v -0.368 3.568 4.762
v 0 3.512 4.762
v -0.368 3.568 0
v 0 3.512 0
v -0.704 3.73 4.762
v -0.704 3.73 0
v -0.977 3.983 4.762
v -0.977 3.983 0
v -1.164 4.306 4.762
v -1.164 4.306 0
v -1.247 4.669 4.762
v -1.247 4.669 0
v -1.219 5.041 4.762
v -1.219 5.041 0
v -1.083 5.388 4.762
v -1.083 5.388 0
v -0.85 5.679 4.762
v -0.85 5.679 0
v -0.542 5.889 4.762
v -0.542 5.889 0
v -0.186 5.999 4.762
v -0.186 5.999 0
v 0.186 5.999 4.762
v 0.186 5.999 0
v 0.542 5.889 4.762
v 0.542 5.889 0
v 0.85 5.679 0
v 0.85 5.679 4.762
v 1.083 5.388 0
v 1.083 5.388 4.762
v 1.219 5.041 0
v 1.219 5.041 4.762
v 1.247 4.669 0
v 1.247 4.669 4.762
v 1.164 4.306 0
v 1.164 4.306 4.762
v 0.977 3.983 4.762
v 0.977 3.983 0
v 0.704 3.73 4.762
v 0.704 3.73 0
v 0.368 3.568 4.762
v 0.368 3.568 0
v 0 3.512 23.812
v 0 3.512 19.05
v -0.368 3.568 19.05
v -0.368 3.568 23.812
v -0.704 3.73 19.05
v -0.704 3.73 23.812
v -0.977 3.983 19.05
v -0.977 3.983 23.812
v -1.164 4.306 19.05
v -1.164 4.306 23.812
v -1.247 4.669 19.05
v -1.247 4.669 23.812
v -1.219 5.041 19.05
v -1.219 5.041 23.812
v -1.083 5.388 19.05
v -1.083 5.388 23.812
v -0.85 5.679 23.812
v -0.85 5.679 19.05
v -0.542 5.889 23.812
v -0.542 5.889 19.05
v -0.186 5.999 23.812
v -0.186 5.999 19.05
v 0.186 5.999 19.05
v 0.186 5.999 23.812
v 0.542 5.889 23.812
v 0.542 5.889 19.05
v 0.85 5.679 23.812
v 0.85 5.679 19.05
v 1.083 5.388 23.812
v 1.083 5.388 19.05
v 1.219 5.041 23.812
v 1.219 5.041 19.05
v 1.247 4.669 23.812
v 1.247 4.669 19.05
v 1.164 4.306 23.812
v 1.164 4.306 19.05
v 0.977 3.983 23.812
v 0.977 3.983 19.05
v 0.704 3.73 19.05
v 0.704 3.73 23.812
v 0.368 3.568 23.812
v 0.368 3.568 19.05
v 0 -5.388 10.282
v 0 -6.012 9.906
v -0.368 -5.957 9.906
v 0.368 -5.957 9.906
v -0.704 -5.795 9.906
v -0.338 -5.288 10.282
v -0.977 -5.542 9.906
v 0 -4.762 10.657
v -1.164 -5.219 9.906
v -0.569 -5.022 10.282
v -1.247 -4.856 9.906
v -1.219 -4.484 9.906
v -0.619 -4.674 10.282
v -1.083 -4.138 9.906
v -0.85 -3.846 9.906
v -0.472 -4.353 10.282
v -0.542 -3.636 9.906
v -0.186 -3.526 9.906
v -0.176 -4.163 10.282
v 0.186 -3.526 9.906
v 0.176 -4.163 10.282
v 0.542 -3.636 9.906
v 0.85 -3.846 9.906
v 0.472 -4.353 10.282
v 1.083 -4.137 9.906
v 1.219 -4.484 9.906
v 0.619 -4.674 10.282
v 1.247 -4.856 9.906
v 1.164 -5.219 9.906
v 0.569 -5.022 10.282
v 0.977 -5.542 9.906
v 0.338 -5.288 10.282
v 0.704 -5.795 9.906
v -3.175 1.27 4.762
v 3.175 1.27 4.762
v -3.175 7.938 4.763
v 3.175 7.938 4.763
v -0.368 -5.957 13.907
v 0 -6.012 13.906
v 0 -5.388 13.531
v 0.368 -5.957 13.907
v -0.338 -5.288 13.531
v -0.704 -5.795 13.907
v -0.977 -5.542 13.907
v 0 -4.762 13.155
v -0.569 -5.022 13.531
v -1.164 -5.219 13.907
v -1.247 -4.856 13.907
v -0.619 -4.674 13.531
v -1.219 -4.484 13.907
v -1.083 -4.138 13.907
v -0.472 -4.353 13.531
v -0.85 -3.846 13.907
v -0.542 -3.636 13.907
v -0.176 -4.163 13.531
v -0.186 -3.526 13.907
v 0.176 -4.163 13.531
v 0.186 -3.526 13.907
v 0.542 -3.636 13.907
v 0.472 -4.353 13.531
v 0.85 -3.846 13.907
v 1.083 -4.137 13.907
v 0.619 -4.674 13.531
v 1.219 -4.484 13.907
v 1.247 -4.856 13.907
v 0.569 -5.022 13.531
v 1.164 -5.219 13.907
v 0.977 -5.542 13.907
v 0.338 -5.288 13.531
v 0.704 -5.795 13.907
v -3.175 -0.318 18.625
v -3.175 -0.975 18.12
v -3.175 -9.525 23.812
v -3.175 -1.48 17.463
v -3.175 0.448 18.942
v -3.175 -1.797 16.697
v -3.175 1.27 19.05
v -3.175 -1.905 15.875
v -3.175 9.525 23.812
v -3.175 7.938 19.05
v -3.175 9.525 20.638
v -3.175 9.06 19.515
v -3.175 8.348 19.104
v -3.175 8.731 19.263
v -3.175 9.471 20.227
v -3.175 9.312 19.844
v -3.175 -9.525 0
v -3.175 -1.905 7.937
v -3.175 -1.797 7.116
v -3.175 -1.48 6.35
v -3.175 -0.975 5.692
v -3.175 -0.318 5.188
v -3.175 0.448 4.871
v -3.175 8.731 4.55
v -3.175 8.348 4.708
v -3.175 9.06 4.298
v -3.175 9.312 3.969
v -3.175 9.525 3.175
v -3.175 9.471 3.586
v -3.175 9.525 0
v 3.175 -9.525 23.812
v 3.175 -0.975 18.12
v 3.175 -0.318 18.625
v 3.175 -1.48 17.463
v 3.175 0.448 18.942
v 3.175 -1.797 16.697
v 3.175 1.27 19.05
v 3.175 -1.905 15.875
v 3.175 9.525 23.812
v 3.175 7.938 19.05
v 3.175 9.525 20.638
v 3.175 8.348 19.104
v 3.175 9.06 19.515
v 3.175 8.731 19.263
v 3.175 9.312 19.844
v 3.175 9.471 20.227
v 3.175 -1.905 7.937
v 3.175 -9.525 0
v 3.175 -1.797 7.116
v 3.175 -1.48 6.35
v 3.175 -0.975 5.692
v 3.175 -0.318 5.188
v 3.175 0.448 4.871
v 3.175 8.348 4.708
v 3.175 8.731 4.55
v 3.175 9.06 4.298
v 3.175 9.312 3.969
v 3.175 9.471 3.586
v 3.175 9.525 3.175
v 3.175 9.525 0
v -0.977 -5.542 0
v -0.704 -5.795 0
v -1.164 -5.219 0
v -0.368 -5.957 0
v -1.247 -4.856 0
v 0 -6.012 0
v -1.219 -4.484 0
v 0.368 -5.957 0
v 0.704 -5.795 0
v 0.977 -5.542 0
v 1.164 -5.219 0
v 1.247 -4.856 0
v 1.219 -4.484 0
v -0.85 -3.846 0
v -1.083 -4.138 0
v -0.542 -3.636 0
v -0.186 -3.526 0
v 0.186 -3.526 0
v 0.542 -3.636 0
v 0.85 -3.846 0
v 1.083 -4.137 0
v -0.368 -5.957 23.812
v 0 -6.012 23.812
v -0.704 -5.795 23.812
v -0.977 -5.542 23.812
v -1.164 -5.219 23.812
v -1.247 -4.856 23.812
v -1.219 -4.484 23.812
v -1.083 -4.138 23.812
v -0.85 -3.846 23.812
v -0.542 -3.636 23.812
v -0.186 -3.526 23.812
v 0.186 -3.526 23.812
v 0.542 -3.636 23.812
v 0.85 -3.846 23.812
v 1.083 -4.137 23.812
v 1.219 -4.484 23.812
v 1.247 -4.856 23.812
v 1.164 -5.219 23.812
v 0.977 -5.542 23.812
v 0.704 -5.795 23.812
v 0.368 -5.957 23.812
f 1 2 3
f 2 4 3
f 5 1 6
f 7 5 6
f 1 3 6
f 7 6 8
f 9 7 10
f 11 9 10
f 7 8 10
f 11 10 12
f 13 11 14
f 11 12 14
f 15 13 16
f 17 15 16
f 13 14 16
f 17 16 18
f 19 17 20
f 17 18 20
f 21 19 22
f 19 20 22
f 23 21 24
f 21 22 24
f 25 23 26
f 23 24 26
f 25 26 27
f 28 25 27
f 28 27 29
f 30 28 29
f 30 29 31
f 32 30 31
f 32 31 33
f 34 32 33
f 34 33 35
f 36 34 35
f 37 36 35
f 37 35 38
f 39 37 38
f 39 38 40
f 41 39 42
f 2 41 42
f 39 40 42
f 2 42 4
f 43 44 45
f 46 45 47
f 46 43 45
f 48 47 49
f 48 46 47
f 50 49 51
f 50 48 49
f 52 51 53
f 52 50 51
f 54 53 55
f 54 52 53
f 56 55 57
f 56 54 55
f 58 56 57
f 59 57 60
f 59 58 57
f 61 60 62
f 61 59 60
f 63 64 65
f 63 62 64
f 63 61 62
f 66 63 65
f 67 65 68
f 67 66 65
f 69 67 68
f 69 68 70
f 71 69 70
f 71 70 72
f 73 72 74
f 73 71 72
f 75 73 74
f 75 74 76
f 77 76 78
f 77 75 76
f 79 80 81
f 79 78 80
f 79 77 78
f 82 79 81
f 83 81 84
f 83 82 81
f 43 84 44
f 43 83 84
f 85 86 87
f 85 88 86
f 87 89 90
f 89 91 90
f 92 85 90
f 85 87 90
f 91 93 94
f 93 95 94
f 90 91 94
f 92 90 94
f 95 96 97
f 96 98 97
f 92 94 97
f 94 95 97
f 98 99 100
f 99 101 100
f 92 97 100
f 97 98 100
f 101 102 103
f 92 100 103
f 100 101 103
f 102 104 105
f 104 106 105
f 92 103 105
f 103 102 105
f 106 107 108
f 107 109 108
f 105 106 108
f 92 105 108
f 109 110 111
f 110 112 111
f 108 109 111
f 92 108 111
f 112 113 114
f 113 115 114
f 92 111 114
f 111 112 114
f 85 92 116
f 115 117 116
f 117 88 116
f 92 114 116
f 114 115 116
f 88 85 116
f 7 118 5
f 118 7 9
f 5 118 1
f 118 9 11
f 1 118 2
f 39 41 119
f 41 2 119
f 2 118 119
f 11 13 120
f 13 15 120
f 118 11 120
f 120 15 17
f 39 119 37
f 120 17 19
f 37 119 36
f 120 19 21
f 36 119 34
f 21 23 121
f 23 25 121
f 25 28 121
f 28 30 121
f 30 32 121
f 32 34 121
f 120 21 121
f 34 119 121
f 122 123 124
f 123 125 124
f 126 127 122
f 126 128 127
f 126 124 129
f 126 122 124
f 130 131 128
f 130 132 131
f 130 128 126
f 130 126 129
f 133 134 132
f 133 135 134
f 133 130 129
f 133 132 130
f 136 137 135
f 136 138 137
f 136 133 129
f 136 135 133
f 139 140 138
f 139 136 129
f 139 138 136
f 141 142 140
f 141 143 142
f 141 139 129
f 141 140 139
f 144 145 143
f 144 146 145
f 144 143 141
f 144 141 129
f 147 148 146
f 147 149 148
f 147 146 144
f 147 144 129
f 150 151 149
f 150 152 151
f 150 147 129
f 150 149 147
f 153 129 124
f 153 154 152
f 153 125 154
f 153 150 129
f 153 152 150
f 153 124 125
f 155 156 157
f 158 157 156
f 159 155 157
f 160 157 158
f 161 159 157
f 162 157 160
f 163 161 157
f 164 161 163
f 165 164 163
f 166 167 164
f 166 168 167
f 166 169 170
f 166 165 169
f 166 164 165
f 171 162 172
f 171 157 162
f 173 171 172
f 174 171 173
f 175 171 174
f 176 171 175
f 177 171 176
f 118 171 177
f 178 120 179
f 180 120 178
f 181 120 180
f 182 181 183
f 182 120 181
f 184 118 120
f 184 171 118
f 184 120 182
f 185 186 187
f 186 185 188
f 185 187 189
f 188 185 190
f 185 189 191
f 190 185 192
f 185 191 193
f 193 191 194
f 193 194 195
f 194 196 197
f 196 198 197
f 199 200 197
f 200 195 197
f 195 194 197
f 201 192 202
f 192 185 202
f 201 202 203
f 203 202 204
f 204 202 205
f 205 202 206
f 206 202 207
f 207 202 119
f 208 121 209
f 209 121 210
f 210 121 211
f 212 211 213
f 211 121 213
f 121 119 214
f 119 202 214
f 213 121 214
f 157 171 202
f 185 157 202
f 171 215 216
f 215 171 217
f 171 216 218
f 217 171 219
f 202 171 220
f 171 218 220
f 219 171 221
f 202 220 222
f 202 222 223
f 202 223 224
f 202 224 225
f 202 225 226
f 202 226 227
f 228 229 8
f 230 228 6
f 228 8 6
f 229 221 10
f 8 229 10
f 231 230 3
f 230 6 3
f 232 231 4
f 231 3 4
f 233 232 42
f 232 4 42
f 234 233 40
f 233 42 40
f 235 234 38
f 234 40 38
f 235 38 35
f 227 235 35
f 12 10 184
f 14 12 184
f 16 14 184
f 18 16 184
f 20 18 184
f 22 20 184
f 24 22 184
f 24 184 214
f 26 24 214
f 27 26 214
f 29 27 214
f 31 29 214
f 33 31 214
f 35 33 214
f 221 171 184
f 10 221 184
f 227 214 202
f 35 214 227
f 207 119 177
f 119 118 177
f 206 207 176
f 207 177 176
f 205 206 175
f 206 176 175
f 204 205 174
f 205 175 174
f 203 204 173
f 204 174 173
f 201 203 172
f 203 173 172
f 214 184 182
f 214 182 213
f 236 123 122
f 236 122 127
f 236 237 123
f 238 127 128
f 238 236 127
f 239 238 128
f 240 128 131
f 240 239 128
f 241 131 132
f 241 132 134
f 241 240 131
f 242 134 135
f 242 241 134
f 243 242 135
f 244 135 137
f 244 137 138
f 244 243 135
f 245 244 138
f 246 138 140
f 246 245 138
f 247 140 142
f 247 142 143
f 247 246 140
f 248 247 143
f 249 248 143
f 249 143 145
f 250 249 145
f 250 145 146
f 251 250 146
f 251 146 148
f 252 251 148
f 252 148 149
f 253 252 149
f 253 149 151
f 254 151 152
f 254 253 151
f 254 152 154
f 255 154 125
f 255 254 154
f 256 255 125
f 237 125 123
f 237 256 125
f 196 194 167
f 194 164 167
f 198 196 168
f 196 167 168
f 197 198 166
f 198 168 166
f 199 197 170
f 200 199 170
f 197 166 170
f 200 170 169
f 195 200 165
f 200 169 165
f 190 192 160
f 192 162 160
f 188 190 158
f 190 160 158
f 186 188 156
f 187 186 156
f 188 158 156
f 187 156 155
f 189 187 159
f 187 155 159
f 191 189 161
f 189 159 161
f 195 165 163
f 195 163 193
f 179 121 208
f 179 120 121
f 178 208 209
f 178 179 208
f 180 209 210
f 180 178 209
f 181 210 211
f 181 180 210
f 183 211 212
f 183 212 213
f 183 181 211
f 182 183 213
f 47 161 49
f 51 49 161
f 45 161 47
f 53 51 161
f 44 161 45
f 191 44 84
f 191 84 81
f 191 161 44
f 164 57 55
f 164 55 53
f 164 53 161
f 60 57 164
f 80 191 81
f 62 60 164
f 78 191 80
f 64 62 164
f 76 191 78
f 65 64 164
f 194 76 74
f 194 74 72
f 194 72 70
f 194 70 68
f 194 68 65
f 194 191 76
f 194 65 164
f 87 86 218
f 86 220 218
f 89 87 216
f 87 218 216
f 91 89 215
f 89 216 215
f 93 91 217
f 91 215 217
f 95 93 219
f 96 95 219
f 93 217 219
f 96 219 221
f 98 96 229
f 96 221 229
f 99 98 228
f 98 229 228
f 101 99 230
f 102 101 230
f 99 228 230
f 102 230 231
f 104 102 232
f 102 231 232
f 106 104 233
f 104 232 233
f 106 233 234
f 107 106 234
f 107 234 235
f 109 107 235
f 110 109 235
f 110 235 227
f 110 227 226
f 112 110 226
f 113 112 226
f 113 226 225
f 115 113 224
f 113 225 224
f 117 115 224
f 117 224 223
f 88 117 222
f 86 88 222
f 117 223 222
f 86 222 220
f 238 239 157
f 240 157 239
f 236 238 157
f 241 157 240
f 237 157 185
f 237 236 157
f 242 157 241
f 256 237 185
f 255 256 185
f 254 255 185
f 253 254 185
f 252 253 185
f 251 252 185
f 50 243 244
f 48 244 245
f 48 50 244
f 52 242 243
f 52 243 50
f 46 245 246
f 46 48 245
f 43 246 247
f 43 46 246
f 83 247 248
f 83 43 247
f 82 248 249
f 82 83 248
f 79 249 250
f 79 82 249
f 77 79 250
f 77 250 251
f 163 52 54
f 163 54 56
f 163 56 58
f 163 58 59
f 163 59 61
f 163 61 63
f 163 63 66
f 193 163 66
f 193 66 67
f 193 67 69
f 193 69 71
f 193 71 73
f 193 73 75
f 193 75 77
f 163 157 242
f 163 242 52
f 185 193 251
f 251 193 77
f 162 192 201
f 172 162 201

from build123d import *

# Parameters (mm, degrees)
SKETCH1_W                      = 6.35
SKETCH1_H                      = 19.05
BOSS_EXTRUDE2_DEPTH            = 23.8125
SKETCH2_W                      = 14.2875
SKETCH2_H                      = 11.43
WHEEL_SLOT_DEPTH               = 27.421265701
M3X0_5_TAPPED_HOLE1_AT_2_COUNT = 2
M3X0_5_TAPPED_HOLE1_AT_2_PITCH = 9.525
FILLET1_R                      = 3.175
FILLET2_R                      = 1.5875


with BuildPart() as part:
    # Sketch1 → Boss-Extrude2 (new body)
    with BuildSketch(Plane.XY):
        Rectangle(SKETCH1_W, SKETCH1_H)
    extrude(amount=BOSS_EXTRUDE2_DEPTH)

    # Sketch2 → WHEEL-SLOT (cut, through all)
    with BuildSketch(Plane(origin=(3.175, 0, 0), x_dir=(0, 0, -1), z_dir=(1, 0, 0))):
        with Locations((-11.90625, 3.81)):
            Rectangle(SKETCH2_W, SKETCH2_H)
    extrude(amount=-WHEEL_SLOT_DEPTH, mode=Mode.SUBTRACT)

    # Sketch4 → M3x0.5 Tapped Hole1 (revolve, cut)
    with BuildSketch(Plane(origin=(0, -4.7625, 23.8125), x_dir=(0, -1, 0), z_dir=(1, 0, 0))):
        Polygon((0, 0), (0, 10.657075774), (1.25, 9.906), (1.25, 0), align=None)
    m3x0_5_tapped_hole1 = revolve(axis=Axis((0, -4.7625, 30.1625), (0, 0, -1)), mode=Mode.SUBTRACT)

    # M3x0.5 Tapped Hole1 at 2: M3x0.5 Tapped Hole1 ×2
    with Locations(*[(0, i * M3X0_5_TAPPED_HOLE1_AT_2_PITCH, 0) for i in range(1, M3X0_5_TAPPED_HOLE1_AT_2_COUNT)]):
        add(m3x0_5_tapped_hole1, mode=Mode.SUBTRACT)

    # M3-TAPPED-MIR: M3x0.5 Tapped Hole1 across plane
    add(m3x0_5_tapped_hole1.mirror(Plane.XY.offset(11.90625)), mode=Mode.SUBTRACT)

    # M3-TAPPED-MIR copy 1 sketch → M3-TAPPED-MIR copy 1 (revolve, cut)
    with BuildSketch(Plane(origin=(0, 4.7625, 0), x_dir=(0, -1, 0), z_dir=(1, 0, 0))):
        Polygon((0, 0), (0, -10.657075774), (1.25, -9.906), (1.25, 0), align=None)
    revolve(axis=Axis((0, 4.7625, -6.35), (0, 0, -1)), mode=Mode.SUBTRACT)

    # Fillet1
    fillet1_edges = [part.edges().sort_by_distance(p)[0] for p in [
        (0, -1.905, 19.05),
        (0, -1.905, 4.7625),
    ]]
    fillet(fillet1_edges, radius=FILLET1_R)

    # Fillet2
    fillet2_edges = [part.edges().sort_by_distance(p)[0] for p in [
        (0, 9.525, 19.05),
        (0, 9.525, 4.7625),
    ]]
    fillet(fillet2_edges, radius=FILLET2_R)


solid = part.part
